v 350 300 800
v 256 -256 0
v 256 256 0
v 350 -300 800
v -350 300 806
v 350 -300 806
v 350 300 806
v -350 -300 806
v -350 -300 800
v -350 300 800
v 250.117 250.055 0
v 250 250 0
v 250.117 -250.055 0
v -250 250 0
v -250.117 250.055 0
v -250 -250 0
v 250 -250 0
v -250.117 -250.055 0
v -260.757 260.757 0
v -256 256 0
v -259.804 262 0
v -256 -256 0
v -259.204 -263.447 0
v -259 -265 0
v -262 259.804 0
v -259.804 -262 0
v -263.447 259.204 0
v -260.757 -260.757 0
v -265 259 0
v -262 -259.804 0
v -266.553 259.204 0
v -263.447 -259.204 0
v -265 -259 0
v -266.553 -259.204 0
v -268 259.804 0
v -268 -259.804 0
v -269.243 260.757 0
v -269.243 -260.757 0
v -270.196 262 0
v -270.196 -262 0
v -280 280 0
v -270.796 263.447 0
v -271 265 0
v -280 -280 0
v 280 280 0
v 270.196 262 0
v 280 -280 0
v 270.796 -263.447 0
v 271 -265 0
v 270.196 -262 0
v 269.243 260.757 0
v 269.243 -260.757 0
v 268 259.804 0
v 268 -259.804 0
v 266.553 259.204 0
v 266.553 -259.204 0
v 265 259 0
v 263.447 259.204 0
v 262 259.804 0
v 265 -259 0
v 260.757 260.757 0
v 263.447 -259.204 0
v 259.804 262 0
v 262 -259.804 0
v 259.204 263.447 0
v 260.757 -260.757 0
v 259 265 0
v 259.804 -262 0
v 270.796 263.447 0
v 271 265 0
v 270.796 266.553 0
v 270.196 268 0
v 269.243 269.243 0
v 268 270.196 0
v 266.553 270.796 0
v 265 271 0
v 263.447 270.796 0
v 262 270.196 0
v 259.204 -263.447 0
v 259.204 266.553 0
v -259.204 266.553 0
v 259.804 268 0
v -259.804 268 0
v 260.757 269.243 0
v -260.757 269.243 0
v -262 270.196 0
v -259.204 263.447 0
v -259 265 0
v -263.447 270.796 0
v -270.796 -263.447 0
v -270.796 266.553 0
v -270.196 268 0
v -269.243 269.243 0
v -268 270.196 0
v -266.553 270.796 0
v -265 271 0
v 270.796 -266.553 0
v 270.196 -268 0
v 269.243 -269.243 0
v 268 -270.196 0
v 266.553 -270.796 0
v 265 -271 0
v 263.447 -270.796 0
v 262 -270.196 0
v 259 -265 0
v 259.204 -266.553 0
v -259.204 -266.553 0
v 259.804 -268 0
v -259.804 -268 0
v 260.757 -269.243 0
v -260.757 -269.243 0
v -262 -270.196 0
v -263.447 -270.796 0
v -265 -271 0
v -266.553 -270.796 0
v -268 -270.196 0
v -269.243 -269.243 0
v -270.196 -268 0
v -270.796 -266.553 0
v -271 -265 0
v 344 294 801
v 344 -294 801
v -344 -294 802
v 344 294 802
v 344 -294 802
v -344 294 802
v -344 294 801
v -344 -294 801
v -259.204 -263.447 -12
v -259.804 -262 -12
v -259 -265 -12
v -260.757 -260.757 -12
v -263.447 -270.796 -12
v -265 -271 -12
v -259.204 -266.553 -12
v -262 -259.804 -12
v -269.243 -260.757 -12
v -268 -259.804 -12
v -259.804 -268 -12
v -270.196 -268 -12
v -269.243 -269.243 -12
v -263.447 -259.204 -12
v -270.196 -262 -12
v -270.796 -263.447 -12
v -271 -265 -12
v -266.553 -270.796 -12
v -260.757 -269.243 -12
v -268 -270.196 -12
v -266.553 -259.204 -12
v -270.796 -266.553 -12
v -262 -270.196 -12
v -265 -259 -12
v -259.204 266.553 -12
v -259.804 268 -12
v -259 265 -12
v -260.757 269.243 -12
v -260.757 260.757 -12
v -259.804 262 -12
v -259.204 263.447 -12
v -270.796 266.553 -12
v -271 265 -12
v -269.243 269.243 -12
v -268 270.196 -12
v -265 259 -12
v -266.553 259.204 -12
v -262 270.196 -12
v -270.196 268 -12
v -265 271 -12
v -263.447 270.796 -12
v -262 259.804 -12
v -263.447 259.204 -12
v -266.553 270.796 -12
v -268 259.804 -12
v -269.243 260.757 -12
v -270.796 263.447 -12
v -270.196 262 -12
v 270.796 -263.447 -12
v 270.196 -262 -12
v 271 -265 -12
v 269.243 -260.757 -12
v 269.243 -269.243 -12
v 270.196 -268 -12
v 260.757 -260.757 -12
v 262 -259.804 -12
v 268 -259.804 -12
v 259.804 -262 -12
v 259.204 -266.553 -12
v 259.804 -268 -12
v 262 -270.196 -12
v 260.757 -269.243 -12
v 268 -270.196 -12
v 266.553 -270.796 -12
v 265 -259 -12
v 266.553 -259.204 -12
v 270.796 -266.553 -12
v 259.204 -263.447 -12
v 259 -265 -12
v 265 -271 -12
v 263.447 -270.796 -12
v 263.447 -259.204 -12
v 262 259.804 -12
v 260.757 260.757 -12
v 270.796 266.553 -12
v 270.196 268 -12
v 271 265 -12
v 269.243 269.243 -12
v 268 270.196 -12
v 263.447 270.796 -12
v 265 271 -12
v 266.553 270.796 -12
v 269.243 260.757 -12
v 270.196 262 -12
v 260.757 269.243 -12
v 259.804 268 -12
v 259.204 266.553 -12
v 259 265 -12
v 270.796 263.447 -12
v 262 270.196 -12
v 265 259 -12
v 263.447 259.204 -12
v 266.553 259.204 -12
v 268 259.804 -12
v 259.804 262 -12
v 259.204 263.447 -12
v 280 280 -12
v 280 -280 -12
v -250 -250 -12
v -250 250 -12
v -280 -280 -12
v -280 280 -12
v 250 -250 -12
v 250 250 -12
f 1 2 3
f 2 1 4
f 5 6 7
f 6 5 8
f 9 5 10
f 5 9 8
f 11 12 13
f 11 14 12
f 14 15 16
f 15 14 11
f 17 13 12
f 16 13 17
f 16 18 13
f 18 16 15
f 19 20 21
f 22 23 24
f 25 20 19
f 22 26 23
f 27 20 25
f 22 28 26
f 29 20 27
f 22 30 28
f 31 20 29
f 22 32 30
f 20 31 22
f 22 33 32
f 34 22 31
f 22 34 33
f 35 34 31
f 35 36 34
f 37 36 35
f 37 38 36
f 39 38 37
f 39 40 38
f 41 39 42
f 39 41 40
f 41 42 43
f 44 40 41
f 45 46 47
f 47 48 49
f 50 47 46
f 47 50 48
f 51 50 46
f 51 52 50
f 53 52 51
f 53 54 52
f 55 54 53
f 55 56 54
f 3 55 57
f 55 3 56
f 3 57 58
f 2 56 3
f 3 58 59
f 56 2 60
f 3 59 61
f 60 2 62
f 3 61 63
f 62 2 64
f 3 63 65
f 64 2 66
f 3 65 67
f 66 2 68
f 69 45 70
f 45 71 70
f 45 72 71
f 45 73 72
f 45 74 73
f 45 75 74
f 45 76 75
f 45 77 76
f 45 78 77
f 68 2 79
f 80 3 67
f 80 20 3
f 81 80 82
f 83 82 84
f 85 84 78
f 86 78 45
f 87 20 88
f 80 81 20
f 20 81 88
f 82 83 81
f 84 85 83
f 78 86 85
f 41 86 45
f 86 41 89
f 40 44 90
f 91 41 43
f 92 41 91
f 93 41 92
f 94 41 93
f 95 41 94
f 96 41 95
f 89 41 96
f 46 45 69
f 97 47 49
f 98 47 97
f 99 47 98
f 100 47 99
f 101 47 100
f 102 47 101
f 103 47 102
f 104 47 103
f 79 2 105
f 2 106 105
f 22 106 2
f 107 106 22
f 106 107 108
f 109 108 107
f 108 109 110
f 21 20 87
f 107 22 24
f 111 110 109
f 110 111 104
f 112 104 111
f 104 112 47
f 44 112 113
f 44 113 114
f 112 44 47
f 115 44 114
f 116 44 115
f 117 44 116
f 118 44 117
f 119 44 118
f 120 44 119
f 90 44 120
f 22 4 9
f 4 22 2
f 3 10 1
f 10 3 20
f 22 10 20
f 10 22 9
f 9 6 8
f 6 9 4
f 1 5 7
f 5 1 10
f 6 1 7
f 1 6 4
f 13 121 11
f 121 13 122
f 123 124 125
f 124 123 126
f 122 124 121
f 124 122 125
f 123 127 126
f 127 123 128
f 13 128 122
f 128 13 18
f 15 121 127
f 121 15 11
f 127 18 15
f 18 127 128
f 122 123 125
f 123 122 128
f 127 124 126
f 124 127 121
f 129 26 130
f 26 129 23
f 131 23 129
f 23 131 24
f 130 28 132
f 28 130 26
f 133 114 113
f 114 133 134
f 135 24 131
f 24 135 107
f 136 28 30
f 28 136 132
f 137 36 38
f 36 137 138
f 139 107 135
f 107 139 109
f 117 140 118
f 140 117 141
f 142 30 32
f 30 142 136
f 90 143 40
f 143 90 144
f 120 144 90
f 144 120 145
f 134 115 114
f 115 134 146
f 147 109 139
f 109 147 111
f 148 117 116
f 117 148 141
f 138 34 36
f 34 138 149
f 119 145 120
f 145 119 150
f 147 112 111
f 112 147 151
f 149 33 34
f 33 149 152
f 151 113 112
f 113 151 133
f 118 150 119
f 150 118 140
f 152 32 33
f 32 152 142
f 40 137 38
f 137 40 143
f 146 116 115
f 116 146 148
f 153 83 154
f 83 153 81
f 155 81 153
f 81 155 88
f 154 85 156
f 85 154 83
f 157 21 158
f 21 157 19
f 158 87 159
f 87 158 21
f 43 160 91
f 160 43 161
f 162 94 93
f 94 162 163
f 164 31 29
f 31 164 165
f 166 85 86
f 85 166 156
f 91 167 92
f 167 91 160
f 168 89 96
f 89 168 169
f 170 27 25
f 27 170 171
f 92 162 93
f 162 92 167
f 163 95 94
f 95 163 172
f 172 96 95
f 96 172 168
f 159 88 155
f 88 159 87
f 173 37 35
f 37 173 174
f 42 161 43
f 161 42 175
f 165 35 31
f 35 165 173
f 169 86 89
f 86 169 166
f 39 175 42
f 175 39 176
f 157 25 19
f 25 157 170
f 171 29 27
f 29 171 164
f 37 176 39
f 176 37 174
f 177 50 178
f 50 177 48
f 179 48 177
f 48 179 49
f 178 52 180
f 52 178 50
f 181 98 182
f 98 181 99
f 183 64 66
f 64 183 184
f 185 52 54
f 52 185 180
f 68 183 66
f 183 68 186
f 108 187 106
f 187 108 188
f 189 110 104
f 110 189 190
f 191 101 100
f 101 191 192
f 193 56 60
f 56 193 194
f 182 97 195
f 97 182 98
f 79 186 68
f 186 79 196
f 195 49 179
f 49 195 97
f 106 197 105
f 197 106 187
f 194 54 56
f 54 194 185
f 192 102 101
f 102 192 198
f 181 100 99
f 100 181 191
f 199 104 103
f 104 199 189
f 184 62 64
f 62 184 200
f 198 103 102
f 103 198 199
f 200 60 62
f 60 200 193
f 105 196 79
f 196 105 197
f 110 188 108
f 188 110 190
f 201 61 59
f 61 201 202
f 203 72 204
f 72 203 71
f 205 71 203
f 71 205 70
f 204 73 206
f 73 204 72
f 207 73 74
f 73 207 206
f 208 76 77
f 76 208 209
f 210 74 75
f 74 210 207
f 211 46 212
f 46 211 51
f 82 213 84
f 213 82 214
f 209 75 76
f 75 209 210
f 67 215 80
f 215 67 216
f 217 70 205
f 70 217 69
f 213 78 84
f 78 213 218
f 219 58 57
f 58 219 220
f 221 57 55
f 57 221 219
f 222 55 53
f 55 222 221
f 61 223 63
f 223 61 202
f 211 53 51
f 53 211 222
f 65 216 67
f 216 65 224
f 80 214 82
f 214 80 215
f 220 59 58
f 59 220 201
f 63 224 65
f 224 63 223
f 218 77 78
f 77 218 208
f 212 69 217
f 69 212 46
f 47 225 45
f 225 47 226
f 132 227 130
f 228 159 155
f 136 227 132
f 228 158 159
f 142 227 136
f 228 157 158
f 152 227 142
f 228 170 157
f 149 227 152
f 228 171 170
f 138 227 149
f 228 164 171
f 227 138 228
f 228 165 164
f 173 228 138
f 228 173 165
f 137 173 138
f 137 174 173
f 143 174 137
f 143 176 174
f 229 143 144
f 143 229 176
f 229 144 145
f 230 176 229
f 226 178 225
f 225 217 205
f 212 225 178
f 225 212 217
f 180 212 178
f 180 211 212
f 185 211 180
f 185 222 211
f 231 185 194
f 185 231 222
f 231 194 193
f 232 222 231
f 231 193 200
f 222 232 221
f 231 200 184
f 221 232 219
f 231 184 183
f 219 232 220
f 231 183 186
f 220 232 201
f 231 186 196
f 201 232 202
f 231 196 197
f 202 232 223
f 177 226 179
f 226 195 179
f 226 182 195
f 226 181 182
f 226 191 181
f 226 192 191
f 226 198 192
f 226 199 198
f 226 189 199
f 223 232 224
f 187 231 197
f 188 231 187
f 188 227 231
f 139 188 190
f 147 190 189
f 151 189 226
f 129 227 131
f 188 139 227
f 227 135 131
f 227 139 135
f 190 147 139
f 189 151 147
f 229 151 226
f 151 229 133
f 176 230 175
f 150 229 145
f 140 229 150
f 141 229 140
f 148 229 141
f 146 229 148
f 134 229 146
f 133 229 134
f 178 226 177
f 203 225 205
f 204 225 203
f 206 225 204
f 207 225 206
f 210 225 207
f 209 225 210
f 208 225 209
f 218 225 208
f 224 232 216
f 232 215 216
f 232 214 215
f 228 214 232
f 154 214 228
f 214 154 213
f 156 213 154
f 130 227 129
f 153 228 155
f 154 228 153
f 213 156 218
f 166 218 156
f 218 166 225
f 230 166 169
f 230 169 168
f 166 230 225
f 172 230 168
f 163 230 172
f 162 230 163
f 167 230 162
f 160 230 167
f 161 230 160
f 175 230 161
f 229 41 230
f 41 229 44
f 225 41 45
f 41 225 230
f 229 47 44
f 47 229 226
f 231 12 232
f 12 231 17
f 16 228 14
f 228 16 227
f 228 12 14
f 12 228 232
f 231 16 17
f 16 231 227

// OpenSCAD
// file: ../params.scad
// Shared millimetre parameters. Keep in lockstep with freecad/params.py.
// Module scale: 150 kg/day wet train. Walls are CPVC sheet, not metal.

$fn = 36;

WALL        = 12;     // CPVC sheet thickness
FLOOR       = 16;     // floor plate (trough sits on this)

// LEACH CSTR 1 — inside liquor box
CSTR_L      = 2000;
CSTR_W      = 1200;
CSTR_H      = 1400;   // liquid + freeboard
FREEBOARD   = 200;

// CSTR 2 weir (same vessel, +X wall)
WEIR_W      = 450;
WEIR_CREST  = CSTR_H - FREEBOARD;   // from inner floor
WEIR_SLOT_H = 80;
WEIR_LIP    = 120;    // external spout projection

// CSTR 3 floor auger — injection-molded PVC / FG
AUGER_D     = 140;    // flight OD
AUGER_SHAFT = 40;
AUGER_PITCH = 110;
AUGER_TROUGH_W = 180;
AUGER_TROUGH_H = 110;
AUGER_OFFSET_Y = 280; // trough centreline from inner -Y wall
AUGER_INCLINE  = 28;  // deg, lifts out of liquor toward +X

// mixer / nozzles (lid)
MIXER_D     = 50;
GAS_D       = 80;     // acid-gas takeoff
DROP_X      = 80;     // inner-X of shred drop slot
DROP_L      = 400;
DROP_W      = 250;
DROP_COAM   = 80;     // raised coaming around the slot

// LEACHATE PUMP / coarse strainer — −X wall, opposite the weir
PUMP_D      = 80;     // DN80
PUMP_Z      = 450;    // centreline above inner floor (submerged)
PUMP_Y      = 900;    // centreline from inner −Y (away from auger)
STRAINER_L  = 180;
STRAINER_W  = 140;
STRAINER_H  = 160;

// mezzanine feed train
MEZZ_H      = 2200;   // platform top above tank outer floor
MEZZ_L      = 1600;   // platform length in −X
MEZZ_THK    = 12;
HOPPER_L    = 700;
HOPPER_W    = 600;
HOPPER_H    = 800;
SHRED_L     = 500;
SHRED_W     = 500;
SHRED_H     = 450;
CONV_W      = 240;
CONV_H      = 120;
CONV_PLATE  = 6;      // trough plate
CONV_FLANGE = 40;
CONV_SPRING_D = 50;
CONV_SPRING_H = 80;
CONV_BOLT   = 10;     // M10 clearance
CONV_LEN    = 1800;   // default standalone length; plant instance is computed
DUST_D      = 150;    // dust-hood outlet to DUST header
AUGER_LIFT_L = 700;

// dewater belts + split (Phase A 4–6)
FDEW_L      = 1800;
FDEW_W      = 450;
FDEW_H      = 80;
FDEW_RISE   = 120;    // solids end higher so liquor runs back to weir
SDEW_L      = 1400;
SDEW_W      = 220;
SDEW_H      = 80;
SPLIT_L     = 600;
SPLIT_W     = 500;
SPLIT_H     = 400;
STUB_L      = 400;
STUB_W      = 300;
STUB_H      = 250;

// EW funnel cell
EW_L        = 600;    // along aisle (overflow direction)
EW_W        = 420;    // anode-cathode depth
EW_H        = 650;    // rectangular body
EW_FUNNEL_H = 220;
EW_VALVE_D  = 50;
EW_VALVE_L  = 60;
EW_MEM_T    = 4;      // CEM
EW_SLOT     = 10;     // membrane cassette slot
EW_PITCH    = 750;    // aisle spacing, centre to centre
AISLE_X0    = 200;
AISLE_Y     = -(EW_W + 2*WALL) - 400;
AISLE_Z     = 400;
BUND_H      = 150;
BUND_PAD    = 250;
SUMP_L      = 400;
SUMP_W      = 400;
SUMP_H      = 300;
VDF_D       = 700;
VDF_L       = 900;
PAIL_W      = 180;
HDR_D       = 80;
HDR_Z       = 1400;
PYRO_D      = 320;
PYRO_L      = 2800;

// Campus envelopes — lockstep with freecad/params.py
FARM_X=12000; FARM_Y=8000; FARM_L=12000; FARM_W=8000; FARM_H=4500;
FAB_X=12000;  FAB_Y=-6000; FAB_L=8000;   FAB_W=6000;  FAB_H=4000;
HAB_X=-8000;  HAB_Y=8000;  HAB_L=8000;   HAB_W=6000;  HAB_H=3200;
CRYO_X=-6000; CRYO_Y=-4000; CRYO_L=4000; CRYO_W=3000; CRYO_H=3000;
MFG_X=2000;   MFG_Y=9000;  MFG_L=6000;   MFG_W=4000;  MFG_H=3500;

LIFE_Z_GREY=900; LIFE_Z_UPW=1100; LIFE_Z_ETCH=1300;
LIFE_Z_O2=2800; LIFE_Z_N2=3000; LIFE_Z_CO2=3200;
LIFE_D_GREY=50; LIFE_D_UPW=40; LIFE_D_ETCH=32;
LIFE_D_GAS=25; LIFE_D_CO2=40;
// main file
// 1.1 HOPPER — pyramid, flanged outlet to shredder. No screen.
include <../params.scad>;
$fn = 24;
t = 6;

module mfg_hopper() {
    difference() {
        hull() {
            translate([-HOPPER_L/2, -HOPPER_W/2, HOPPER_H])
                cube([HOPPER_L, HOPPER_W, t]);
            translate([-SHRED_L/2 - t, -SHRED_W/2 - t, 0])
                cube([SHRED_L + 2*t, SHRED_W + 2*t, t]);
        }
        hull() {
            translate([-HOPPER_L/2 + t, -HOPPER_W/2 + t, HOPPER_H + 1])
                cube([HOPPER_L - 2*t, HOPPER_W - 2*t, 1]);
            translate([-SHRED_L/2, -SHRED_W/2, -1])
                cube([SHRED_L, SHRED_W, t + 2]);
        }
    }
    // outlet flange
    difference() {
        translate([-SHRED_L/2 - 30, -SHRED_W/2 - 30, -12])
            cube([SHRED_L + 60, SHRED_W + 60, 12]);
        translate([-SHRED_L/2, -SHRED_W/2, -13])
            cube([SHRED_L, SHRED_W, 14]);
        for (x = [-SHRED_L/2 - 15, SHRED_L/2 + 15])
            for (y = [-SHRED_W/2 - 15, SHRED_W/2 + 15])
                translate([x, y, -13]) cylinder(h=14, d=12);
    }
}
mfg_hopper();
